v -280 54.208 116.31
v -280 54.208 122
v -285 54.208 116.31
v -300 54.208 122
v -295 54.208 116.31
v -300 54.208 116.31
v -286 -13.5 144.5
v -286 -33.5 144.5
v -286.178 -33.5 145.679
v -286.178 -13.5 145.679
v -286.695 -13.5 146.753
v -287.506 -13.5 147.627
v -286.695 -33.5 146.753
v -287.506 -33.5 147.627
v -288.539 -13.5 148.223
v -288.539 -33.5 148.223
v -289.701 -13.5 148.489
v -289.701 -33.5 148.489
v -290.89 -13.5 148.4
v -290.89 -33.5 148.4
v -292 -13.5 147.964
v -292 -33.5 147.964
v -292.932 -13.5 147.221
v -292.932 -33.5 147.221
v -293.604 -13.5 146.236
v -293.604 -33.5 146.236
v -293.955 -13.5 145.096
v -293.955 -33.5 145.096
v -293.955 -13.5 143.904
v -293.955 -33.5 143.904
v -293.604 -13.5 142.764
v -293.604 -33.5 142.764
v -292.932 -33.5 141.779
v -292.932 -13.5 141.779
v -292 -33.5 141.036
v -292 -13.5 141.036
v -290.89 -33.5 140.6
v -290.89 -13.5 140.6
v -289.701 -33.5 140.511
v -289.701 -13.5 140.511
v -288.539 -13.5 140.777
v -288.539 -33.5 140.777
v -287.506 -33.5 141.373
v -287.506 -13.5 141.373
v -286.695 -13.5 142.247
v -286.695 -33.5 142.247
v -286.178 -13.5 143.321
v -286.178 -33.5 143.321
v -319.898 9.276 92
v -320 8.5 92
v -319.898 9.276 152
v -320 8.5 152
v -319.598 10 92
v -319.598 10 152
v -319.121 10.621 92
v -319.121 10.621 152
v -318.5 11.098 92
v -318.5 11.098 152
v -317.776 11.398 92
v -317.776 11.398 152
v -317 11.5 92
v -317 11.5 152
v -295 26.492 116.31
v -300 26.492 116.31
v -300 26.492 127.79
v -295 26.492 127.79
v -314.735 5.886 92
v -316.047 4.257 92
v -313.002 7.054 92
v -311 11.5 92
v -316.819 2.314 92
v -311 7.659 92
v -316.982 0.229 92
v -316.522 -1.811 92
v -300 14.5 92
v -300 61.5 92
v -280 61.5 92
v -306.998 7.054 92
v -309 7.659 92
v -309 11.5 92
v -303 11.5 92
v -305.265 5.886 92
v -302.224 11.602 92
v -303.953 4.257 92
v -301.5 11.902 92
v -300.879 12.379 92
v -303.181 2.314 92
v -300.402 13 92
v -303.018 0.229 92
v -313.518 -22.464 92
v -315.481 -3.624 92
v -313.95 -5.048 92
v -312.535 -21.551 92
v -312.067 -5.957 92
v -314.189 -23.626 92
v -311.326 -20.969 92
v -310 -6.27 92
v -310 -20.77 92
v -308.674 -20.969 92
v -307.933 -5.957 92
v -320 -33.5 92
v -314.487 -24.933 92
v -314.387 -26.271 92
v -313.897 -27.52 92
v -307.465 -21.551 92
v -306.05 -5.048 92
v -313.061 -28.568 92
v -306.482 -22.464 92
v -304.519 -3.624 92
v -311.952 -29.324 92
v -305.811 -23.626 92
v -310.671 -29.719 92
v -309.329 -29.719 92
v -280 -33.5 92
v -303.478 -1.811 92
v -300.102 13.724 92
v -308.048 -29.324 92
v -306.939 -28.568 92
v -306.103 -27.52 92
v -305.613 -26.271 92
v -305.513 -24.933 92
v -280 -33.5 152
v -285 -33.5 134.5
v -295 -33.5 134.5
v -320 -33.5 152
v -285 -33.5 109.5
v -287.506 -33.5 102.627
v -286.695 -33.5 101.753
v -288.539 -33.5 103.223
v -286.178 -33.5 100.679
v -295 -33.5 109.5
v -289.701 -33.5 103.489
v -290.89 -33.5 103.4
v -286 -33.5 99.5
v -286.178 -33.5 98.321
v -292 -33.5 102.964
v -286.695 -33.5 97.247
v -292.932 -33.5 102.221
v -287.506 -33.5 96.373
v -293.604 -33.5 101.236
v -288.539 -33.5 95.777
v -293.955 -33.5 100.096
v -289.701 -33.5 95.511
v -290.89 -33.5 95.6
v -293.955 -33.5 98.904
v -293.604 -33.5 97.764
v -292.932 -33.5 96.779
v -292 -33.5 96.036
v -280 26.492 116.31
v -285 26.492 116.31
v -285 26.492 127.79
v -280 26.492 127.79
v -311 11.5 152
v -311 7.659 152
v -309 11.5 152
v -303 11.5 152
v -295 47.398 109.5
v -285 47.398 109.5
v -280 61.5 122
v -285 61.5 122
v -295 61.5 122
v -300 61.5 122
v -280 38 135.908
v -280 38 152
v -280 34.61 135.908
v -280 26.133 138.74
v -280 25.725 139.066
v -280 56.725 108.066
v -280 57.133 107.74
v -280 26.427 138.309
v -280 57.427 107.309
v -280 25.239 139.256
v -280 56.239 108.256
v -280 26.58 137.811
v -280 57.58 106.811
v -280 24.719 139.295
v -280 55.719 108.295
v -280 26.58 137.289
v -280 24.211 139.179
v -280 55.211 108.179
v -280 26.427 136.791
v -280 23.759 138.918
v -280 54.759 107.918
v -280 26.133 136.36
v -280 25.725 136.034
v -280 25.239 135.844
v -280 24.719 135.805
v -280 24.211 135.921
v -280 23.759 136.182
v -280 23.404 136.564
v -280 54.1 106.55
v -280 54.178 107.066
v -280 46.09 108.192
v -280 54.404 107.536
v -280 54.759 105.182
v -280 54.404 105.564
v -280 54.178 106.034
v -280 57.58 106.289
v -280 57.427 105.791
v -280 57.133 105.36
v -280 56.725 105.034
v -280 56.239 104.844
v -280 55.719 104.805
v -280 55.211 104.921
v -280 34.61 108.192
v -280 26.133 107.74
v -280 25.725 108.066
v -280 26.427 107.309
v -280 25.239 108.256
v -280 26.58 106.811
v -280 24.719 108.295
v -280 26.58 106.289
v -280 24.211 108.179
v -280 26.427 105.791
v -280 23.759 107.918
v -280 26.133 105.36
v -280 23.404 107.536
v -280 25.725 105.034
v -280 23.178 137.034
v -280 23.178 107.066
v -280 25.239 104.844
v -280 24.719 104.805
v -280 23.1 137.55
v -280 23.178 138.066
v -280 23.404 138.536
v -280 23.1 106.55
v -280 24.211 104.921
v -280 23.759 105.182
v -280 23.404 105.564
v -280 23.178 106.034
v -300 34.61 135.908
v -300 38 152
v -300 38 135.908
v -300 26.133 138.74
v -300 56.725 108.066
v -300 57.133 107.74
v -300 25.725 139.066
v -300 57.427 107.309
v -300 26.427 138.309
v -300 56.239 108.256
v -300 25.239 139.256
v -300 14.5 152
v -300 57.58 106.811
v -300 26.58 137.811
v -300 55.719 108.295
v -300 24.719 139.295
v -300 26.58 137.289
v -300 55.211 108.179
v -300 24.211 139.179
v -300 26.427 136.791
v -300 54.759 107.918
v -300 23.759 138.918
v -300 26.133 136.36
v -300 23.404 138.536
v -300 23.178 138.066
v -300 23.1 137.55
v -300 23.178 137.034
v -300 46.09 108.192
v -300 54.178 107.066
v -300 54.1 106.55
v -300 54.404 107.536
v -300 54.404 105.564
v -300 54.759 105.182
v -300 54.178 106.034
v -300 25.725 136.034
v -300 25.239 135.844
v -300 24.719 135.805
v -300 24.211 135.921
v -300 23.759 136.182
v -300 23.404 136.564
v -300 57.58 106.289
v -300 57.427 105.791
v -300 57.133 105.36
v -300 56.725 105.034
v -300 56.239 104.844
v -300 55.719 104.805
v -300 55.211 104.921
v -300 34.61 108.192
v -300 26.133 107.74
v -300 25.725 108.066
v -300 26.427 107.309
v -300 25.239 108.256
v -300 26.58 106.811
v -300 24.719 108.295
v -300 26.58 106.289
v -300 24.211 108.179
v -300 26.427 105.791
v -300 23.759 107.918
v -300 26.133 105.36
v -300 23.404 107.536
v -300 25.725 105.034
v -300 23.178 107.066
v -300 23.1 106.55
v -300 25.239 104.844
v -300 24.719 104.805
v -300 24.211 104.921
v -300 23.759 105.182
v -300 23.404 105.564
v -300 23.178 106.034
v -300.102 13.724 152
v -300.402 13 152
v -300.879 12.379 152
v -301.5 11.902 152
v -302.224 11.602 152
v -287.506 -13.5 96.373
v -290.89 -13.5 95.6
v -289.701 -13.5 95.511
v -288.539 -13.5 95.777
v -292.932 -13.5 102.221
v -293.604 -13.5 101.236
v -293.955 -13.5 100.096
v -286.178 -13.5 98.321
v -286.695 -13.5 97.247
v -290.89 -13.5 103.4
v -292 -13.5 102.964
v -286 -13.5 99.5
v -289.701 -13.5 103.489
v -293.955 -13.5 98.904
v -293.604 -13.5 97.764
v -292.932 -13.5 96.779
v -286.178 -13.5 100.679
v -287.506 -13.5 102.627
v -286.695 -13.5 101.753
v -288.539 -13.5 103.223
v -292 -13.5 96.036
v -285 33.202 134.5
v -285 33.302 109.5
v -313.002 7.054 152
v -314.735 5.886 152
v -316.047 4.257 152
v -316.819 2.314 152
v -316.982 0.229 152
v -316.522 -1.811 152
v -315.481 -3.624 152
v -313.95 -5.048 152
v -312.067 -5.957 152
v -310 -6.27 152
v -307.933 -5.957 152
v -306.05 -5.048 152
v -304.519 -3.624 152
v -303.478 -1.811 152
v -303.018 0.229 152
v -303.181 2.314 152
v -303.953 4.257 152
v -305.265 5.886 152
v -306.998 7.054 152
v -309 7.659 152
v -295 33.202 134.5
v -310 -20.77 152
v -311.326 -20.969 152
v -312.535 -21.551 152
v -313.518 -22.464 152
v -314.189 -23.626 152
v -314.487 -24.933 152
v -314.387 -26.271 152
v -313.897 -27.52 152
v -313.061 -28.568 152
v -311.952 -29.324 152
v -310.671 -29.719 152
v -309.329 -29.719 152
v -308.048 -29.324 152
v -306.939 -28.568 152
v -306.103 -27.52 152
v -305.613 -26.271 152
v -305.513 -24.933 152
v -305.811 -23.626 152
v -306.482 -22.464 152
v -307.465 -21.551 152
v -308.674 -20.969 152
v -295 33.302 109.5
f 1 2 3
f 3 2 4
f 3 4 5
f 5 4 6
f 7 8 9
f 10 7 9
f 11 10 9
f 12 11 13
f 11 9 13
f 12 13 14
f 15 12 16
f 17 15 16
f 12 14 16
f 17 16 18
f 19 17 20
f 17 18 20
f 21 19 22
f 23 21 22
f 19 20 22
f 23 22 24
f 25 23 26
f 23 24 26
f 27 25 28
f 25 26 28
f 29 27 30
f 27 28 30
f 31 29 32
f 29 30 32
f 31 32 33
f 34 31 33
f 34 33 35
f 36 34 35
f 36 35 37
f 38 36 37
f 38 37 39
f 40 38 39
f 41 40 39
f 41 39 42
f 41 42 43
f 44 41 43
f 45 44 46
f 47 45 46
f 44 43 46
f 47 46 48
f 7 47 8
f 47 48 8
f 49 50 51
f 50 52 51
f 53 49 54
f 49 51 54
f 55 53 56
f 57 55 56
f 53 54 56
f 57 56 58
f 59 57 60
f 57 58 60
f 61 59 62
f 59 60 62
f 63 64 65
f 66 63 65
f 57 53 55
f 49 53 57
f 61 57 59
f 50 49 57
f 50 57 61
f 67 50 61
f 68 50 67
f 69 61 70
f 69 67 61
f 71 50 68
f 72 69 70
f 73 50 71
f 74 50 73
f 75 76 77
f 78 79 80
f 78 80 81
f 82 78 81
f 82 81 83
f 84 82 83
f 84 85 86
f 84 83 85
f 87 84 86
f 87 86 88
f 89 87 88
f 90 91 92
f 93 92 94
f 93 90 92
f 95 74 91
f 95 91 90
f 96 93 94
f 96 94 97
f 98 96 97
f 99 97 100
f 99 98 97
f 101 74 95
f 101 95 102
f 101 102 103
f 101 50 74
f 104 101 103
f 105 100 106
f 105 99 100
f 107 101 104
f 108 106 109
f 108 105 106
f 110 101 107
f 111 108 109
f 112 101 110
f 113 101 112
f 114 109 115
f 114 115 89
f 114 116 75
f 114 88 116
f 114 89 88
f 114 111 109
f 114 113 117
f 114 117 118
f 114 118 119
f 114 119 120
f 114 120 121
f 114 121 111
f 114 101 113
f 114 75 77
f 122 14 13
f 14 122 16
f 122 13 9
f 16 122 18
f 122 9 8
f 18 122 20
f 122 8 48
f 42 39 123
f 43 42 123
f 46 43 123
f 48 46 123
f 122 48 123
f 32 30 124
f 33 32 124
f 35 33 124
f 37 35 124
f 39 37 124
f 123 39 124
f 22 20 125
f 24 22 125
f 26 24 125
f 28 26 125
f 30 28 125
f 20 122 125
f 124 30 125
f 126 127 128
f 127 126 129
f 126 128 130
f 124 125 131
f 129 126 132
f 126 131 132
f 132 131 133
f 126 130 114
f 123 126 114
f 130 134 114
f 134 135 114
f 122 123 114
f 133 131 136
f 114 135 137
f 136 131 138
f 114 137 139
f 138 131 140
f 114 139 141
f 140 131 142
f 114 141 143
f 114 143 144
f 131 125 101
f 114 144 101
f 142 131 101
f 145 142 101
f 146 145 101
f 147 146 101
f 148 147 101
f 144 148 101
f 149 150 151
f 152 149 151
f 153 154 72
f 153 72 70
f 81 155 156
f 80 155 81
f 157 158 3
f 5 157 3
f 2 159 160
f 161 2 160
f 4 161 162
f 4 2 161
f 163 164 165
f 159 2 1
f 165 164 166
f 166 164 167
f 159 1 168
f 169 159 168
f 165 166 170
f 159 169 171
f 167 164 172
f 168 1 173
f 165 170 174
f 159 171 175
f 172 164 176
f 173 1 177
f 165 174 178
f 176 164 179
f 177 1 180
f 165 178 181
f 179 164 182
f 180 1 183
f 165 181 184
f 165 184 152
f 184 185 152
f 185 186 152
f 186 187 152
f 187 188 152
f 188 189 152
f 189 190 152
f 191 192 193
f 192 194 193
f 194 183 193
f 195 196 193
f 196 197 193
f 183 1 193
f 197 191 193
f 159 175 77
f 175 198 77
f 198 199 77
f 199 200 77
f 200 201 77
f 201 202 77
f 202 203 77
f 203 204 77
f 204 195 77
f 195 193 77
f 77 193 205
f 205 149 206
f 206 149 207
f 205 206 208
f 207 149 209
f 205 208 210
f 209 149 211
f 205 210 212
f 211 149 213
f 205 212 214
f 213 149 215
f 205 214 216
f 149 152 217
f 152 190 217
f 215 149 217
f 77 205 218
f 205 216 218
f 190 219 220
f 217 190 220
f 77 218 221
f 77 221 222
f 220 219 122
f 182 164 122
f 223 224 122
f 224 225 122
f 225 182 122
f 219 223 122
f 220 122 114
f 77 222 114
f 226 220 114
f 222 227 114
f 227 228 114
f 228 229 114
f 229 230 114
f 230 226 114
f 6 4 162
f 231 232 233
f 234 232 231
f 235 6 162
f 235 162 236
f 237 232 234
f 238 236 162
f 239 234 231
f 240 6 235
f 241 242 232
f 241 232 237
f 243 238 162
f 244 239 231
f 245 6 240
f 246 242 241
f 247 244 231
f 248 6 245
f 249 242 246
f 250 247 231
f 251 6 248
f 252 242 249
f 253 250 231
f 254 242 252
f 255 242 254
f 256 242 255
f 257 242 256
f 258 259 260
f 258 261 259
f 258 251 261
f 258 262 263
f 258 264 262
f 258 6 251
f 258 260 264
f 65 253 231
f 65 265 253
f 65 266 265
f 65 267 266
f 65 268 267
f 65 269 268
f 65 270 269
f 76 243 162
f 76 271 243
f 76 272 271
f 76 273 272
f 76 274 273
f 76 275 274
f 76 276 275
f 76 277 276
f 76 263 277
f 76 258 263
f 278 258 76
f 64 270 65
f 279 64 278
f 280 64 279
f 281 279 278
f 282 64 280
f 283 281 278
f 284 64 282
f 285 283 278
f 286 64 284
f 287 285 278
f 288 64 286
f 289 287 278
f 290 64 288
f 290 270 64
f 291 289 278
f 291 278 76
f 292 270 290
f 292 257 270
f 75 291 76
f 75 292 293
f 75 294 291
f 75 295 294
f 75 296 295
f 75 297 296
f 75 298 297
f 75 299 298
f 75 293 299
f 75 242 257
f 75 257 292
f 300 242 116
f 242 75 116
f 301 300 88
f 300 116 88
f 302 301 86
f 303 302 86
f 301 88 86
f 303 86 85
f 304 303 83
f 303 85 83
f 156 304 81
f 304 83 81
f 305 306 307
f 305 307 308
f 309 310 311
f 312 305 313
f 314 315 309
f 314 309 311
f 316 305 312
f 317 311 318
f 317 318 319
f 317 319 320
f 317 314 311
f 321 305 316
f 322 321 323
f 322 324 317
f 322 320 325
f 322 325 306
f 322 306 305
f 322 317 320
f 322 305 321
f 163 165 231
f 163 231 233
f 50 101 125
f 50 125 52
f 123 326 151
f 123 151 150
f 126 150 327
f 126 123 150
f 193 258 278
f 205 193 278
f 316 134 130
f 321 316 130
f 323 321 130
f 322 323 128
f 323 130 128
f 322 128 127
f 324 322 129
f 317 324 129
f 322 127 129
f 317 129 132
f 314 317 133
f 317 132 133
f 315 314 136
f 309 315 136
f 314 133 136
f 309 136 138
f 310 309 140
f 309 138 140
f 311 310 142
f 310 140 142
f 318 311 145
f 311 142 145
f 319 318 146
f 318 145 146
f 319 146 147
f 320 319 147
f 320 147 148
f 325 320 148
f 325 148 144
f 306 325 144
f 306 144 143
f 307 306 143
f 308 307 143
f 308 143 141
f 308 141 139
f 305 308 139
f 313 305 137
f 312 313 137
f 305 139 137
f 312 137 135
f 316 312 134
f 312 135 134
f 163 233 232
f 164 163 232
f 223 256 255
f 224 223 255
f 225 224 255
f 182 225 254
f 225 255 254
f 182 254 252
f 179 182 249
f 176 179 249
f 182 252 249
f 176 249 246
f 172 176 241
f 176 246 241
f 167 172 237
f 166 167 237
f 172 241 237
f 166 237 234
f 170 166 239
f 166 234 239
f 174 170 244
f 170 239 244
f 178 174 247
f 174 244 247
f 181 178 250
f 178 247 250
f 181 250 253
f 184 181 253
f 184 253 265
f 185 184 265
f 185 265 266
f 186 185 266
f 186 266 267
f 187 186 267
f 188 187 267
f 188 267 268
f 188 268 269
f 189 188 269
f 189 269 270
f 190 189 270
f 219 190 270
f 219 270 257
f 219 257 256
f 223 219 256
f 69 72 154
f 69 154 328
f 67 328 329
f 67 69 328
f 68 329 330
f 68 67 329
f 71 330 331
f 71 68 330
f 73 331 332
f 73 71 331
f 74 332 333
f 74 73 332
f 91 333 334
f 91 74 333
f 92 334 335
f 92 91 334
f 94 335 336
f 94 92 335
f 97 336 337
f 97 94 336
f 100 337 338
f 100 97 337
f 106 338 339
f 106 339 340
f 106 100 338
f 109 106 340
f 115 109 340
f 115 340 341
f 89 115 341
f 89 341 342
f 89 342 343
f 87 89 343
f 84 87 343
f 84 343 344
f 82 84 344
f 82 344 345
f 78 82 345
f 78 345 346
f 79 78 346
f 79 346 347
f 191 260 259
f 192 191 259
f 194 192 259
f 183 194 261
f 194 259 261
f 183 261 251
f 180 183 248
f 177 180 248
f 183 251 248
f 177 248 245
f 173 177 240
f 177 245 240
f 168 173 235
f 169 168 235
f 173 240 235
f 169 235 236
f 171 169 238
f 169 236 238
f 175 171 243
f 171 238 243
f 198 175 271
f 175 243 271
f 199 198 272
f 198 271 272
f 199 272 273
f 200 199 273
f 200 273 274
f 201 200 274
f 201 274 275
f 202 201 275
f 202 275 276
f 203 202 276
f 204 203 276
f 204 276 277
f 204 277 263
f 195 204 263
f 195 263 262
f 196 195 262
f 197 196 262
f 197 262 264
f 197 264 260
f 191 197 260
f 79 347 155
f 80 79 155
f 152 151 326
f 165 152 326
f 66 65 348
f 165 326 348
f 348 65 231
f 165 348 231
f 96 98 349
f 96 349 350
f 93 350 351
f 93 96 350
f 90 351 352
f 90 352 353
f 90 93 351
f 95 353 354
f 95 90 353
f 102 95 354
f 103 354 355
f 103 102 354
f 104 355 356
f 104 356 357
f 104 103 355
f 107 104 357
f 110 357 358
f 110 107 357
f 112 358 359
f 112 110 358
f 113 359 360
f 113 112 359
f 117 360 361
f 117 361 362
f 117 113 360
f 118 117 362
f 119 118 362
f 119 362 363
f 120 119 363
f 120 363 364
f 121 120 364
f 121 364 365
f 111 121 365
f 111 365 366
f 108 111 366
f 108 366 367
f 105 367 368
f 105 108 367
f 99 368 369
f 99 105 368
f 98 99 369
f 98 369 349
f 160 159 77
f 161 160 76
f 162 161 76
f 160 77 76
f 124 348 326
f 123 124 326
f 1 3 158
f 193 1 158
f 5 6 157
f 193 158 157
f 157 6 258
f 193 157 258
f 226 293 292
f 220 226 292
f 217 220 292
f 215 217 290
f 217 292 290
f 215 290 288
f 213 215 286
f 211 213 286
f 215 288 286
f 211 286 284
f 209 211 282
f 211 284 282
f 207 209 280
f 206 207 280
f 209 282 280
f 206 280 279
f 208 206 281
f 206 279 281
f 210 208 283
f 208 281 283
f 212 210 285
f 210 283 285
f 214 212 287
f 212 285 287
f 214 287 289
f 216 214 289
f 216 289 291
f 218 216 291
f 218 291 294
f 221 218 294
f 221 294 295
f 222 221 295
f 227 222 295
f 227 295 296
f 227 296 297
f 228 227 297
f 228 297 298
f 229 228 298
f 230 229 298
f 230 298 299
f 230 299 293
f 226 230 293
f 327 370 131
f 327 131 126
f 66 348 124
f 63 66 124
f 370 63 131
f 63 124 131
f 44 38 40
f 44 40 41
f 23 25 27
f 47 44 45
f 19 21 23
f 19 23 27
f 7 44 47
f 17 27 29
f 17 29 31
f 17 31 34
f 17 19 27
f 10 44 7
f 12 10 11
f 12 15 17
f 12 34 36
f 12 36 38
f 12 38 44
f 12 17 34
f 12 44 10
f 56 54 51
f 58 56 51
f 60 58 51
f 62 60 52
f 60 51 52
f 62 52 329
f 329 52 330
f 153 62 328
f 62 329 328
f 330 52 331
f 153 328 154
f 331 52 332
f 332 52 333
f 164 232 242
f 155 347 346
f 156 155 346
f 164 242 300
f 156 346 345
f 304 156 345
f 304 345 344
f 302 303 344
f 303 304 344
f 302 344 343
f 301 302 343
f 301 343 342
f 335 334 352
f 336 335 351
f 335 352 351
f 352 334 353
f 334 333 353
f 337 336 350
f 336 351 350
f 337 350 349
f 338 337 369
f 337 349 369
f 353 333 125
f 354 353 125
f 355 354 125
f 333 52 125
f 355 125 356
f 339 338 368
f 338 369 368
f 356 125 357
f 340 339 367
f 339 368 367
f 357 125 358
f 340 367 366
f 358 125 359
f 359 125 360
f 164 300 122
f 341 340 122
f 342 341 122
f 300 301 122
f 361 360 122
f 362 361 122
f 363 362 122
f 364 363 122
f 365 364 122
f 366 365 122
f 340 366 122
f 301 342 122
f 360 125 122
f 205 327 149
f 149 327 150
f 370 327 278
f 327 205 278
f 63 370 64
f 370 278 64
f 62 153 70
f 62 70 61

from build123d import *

# Parameters (mm, degrees)
SKETCH060_W              = 45
SKETCH060_H              = 20
SKETCH060_R              = 4.5
SKETCH060_R_2            = 7
PAD033_DEPTH             = 60
SKETCH061_W              = 4
SKETCH061_H              = 2
POCKET031_DEPTH          = 60.001
POCKET031_FACE6_W        = 45
POCKET031_FACE6_H        = 60
PAD034_DEPTH             = 20
SKETCH062_W              = 10
SKETCH062_H              = 25
POCKET032_DEPTH          = 47
SKETCH063_R              = 4
POCKET033_DEPTH          = 20
POCKET033_FACE21_W       = 20
POCKET033_FACE21_H       = 60
POCKET033_FACE21_W_2     = 10
POCKET033_FACE21_H_2     = 25
PAD035_DEPTH             = 50
FILLET004_R              = 3
FILLET005_R              = 3
SKETCH064_R              = 1.75
POCKET034_DEPTH          = 20.001
SKETCH065_W              = 23.5
SKETCH065_H              = 30
POCKET035_DEPTH          = 20.001
POCKET035_FACE41_W       = 10
POCKET035_FACE41_H       = 14.1015555269
PAD036_DEPTH             = 12.5
POCKET036_DEPTH          = 35.001
BODY019_PLACEMENT_ANGLE  = 180
CLONE047_PLACEMENT_ANGLE = 90


with BuildPart() as part:
    # Sketch060 → Pad033 (new body)
    with BuildSketch(Plane.XY):
        Rectangle(SKETCH060_W, SKETCH060_H)
        with Locations((-14.26955, 0)):
            Circle(SKETCH060_R, mode=Mode.SUBTRACT)
        with Locations((11.73045, 0)):
            Circle(SKETCH060_R_2, mode=Mode.SUBTRACT)
    extrude(amount=PAD033_DEPTH)

    # Sketch061 (on Face8 of Pad033) → Pocket031 (cut, through all)
    with BuildSketch(Plane.XY.offset(60)):
        with Locations((20.51, 0)):
            Rectangle(SKETCH061_W, SKETCH061_H)
    extrude(amount=-POCKET031_DEPTH, mode=Mode.SUBTRACT)

    # Pocket031 Face6 → Pad034 (add)
    with BuildSketch(Plane(origin=(0, -10, 30), x_dir=(-1, 0, 0), z_dir=(0, -1, 0))):
        Rectangle(POCKET031_FACE6_W, POCKET031_FACE6_H)
    extrude(amount=PAD034_DEPTH)

    # Sketch062 (on Face6 of Pad034) → Pocket032 (cut)
    with BuildSketch(Plane(origin=(-22.5, 0, 0), x_dir=(0, -1, 0), z_dir=(-1, 0, 0))):
        with Locations((20, 30)):
            Rectangle(SKETCH062_W, SKETCH062_H)
    extrude(amount=-POCKET032_DEPTH, mode=Mode.SUBTRACT)

    # Sketch063 (on Face6 of Pocket032) → Pocket033 (cut)
    with BuildSketch(Plane(origin=(-22.5, 0, 0), x_dir=(0, -1, 0), z_dir=(-1, 0, 0))):
        with Locations((20, 52.5)):
            Circle(SKETCH063_R)
        with Locations((20, 7.5)):
            Circle(SKETCH063_R)
    extrude(amount=-POCKET033_DEPTH, mode=Mode.SUBTRACT)

    # Pocket033 Face21 → Pad035 (add)
    with BuildSketch(Plane(origin=(22.5, -20, 30), x_dir=(0, -1, 0), z_dir=(1, 0, 0))):
        Rectangle(POCKET033_FACE21_W, POCKET033_FACE21_H)
        Rectangle(POCKET033_FACE21_W_2, POCKET033_FACE21_H_2, mode=Mode.SUBTRACT)
    extrude(amount=PAD035_DEPTH)

    # Fillet004
    fillet004_edges = [part.edges().sort_by_distance(p)[0] for p in [
        (22.5, -10, 30),
    ]]
    fillet(fillet004_edges, radius=FILLET004_R)

    # Fillet005
    fillet005_edges = [part.edges().sort_by_distance(p)[0] for p in [
        (22.5, 10, 30),
    ]]
    fillet(fillet005_edges, radius=FILLET005_R)

    # Sketch064 (on Face16 of Fillet005) → Pocket034 (cut, through all)
    with BuildSketch(Plane(origin=(0, -10, 0), x_dir=(-1, 0, 0), z_dir=(0, 1, 0))):
        with Locations((-35.85, 45.55)):
            Circle(SKETCH064_R)
        with Locations((-66.85, 45.55)):
            Circle(SKETCH064_R)
        with Locations((-66.85, 14.55)):
            Circle(SKETCH064_R)
        with Locations((-35.85, 14.55)):
            Circle(SKETCH064_R)
        Polygon((-37.4918070123, 35.7902514855), (-45.6097485145, 43.9081929877), (-57.0902514855, 43.9081929877), (-65.2081929877, 35.7902514855), (-65.2081929877, 24.3097485145), (-57.0902514855, 16.1918070123), (-45.6097485145, 16.1918070123), (-37.4918070123, 24.3097485145), align=None)
    extrude(amount=-POCKET034_DEPTH, mode=Mode.SUBTRACT)

    # Sketch065 (on Face16 of Pocket034) → Pocket035 (cut, through all)
    with BuildSketch(Plane(origin=(0, -10, 0), x_dir=(-1, 0, 0), z_dir=(0, 1, 0))):
        with Locations((-60.75, 45)):
            Rectangle(SKETCH065_W, SKETCH065_H)
    extrude(amount=-POCKET035_DEPTH, mode=Mode.SUBTRACT)

    # Pocket035 Face41 → Pad036 (add)
    with BuildSketch(Plane(origin=(65.4492222366, -20, 17.5), x_dir=(0, 1, 0), z_dir=(0, 0, 1))):
        Rectangle(POCKET035_FACE41_W, POCKET035_FACE41_H)
    extrude(amount=PAD036_DEPTH)

    # Pad036 Face50 → Pocket036 (cut, through all)
    with BuildSketch(Plane(origin=(61.3784329533, -25, 25.2399942401), x_dir=(-1, 0, 0), z_dir=(0, -1, 0))):
        Polygon((2.9799884801, 7.7399942401), (-3.8297600344, 0.9302457255), (-3.8297600344, -4.7600057599), (2.9799884801, -4.7600057599), align=None)
    extrude(amount=-POCKET036_DEPTH, mode=Mode.SUBTRACT)


with BuildPart() as part_1:
    # Body019 placement: moved
    add(part.part.moved(Location((-73, 0, 0))).rotate(Axis((-73, 0, 0), (0, 0, 1)), BODY019_PLACEMENT_ANGLE))


with BuildPart() as part_2:
    # Clone047 placement: moved
    add(part_1.part.moved(Location((-310, -84, 92))).rotate(Axis((-310, -84, 92), (0, 0, -1)), CLONE047_PLACEMENT_ANGLE))


solid = part_2.part
